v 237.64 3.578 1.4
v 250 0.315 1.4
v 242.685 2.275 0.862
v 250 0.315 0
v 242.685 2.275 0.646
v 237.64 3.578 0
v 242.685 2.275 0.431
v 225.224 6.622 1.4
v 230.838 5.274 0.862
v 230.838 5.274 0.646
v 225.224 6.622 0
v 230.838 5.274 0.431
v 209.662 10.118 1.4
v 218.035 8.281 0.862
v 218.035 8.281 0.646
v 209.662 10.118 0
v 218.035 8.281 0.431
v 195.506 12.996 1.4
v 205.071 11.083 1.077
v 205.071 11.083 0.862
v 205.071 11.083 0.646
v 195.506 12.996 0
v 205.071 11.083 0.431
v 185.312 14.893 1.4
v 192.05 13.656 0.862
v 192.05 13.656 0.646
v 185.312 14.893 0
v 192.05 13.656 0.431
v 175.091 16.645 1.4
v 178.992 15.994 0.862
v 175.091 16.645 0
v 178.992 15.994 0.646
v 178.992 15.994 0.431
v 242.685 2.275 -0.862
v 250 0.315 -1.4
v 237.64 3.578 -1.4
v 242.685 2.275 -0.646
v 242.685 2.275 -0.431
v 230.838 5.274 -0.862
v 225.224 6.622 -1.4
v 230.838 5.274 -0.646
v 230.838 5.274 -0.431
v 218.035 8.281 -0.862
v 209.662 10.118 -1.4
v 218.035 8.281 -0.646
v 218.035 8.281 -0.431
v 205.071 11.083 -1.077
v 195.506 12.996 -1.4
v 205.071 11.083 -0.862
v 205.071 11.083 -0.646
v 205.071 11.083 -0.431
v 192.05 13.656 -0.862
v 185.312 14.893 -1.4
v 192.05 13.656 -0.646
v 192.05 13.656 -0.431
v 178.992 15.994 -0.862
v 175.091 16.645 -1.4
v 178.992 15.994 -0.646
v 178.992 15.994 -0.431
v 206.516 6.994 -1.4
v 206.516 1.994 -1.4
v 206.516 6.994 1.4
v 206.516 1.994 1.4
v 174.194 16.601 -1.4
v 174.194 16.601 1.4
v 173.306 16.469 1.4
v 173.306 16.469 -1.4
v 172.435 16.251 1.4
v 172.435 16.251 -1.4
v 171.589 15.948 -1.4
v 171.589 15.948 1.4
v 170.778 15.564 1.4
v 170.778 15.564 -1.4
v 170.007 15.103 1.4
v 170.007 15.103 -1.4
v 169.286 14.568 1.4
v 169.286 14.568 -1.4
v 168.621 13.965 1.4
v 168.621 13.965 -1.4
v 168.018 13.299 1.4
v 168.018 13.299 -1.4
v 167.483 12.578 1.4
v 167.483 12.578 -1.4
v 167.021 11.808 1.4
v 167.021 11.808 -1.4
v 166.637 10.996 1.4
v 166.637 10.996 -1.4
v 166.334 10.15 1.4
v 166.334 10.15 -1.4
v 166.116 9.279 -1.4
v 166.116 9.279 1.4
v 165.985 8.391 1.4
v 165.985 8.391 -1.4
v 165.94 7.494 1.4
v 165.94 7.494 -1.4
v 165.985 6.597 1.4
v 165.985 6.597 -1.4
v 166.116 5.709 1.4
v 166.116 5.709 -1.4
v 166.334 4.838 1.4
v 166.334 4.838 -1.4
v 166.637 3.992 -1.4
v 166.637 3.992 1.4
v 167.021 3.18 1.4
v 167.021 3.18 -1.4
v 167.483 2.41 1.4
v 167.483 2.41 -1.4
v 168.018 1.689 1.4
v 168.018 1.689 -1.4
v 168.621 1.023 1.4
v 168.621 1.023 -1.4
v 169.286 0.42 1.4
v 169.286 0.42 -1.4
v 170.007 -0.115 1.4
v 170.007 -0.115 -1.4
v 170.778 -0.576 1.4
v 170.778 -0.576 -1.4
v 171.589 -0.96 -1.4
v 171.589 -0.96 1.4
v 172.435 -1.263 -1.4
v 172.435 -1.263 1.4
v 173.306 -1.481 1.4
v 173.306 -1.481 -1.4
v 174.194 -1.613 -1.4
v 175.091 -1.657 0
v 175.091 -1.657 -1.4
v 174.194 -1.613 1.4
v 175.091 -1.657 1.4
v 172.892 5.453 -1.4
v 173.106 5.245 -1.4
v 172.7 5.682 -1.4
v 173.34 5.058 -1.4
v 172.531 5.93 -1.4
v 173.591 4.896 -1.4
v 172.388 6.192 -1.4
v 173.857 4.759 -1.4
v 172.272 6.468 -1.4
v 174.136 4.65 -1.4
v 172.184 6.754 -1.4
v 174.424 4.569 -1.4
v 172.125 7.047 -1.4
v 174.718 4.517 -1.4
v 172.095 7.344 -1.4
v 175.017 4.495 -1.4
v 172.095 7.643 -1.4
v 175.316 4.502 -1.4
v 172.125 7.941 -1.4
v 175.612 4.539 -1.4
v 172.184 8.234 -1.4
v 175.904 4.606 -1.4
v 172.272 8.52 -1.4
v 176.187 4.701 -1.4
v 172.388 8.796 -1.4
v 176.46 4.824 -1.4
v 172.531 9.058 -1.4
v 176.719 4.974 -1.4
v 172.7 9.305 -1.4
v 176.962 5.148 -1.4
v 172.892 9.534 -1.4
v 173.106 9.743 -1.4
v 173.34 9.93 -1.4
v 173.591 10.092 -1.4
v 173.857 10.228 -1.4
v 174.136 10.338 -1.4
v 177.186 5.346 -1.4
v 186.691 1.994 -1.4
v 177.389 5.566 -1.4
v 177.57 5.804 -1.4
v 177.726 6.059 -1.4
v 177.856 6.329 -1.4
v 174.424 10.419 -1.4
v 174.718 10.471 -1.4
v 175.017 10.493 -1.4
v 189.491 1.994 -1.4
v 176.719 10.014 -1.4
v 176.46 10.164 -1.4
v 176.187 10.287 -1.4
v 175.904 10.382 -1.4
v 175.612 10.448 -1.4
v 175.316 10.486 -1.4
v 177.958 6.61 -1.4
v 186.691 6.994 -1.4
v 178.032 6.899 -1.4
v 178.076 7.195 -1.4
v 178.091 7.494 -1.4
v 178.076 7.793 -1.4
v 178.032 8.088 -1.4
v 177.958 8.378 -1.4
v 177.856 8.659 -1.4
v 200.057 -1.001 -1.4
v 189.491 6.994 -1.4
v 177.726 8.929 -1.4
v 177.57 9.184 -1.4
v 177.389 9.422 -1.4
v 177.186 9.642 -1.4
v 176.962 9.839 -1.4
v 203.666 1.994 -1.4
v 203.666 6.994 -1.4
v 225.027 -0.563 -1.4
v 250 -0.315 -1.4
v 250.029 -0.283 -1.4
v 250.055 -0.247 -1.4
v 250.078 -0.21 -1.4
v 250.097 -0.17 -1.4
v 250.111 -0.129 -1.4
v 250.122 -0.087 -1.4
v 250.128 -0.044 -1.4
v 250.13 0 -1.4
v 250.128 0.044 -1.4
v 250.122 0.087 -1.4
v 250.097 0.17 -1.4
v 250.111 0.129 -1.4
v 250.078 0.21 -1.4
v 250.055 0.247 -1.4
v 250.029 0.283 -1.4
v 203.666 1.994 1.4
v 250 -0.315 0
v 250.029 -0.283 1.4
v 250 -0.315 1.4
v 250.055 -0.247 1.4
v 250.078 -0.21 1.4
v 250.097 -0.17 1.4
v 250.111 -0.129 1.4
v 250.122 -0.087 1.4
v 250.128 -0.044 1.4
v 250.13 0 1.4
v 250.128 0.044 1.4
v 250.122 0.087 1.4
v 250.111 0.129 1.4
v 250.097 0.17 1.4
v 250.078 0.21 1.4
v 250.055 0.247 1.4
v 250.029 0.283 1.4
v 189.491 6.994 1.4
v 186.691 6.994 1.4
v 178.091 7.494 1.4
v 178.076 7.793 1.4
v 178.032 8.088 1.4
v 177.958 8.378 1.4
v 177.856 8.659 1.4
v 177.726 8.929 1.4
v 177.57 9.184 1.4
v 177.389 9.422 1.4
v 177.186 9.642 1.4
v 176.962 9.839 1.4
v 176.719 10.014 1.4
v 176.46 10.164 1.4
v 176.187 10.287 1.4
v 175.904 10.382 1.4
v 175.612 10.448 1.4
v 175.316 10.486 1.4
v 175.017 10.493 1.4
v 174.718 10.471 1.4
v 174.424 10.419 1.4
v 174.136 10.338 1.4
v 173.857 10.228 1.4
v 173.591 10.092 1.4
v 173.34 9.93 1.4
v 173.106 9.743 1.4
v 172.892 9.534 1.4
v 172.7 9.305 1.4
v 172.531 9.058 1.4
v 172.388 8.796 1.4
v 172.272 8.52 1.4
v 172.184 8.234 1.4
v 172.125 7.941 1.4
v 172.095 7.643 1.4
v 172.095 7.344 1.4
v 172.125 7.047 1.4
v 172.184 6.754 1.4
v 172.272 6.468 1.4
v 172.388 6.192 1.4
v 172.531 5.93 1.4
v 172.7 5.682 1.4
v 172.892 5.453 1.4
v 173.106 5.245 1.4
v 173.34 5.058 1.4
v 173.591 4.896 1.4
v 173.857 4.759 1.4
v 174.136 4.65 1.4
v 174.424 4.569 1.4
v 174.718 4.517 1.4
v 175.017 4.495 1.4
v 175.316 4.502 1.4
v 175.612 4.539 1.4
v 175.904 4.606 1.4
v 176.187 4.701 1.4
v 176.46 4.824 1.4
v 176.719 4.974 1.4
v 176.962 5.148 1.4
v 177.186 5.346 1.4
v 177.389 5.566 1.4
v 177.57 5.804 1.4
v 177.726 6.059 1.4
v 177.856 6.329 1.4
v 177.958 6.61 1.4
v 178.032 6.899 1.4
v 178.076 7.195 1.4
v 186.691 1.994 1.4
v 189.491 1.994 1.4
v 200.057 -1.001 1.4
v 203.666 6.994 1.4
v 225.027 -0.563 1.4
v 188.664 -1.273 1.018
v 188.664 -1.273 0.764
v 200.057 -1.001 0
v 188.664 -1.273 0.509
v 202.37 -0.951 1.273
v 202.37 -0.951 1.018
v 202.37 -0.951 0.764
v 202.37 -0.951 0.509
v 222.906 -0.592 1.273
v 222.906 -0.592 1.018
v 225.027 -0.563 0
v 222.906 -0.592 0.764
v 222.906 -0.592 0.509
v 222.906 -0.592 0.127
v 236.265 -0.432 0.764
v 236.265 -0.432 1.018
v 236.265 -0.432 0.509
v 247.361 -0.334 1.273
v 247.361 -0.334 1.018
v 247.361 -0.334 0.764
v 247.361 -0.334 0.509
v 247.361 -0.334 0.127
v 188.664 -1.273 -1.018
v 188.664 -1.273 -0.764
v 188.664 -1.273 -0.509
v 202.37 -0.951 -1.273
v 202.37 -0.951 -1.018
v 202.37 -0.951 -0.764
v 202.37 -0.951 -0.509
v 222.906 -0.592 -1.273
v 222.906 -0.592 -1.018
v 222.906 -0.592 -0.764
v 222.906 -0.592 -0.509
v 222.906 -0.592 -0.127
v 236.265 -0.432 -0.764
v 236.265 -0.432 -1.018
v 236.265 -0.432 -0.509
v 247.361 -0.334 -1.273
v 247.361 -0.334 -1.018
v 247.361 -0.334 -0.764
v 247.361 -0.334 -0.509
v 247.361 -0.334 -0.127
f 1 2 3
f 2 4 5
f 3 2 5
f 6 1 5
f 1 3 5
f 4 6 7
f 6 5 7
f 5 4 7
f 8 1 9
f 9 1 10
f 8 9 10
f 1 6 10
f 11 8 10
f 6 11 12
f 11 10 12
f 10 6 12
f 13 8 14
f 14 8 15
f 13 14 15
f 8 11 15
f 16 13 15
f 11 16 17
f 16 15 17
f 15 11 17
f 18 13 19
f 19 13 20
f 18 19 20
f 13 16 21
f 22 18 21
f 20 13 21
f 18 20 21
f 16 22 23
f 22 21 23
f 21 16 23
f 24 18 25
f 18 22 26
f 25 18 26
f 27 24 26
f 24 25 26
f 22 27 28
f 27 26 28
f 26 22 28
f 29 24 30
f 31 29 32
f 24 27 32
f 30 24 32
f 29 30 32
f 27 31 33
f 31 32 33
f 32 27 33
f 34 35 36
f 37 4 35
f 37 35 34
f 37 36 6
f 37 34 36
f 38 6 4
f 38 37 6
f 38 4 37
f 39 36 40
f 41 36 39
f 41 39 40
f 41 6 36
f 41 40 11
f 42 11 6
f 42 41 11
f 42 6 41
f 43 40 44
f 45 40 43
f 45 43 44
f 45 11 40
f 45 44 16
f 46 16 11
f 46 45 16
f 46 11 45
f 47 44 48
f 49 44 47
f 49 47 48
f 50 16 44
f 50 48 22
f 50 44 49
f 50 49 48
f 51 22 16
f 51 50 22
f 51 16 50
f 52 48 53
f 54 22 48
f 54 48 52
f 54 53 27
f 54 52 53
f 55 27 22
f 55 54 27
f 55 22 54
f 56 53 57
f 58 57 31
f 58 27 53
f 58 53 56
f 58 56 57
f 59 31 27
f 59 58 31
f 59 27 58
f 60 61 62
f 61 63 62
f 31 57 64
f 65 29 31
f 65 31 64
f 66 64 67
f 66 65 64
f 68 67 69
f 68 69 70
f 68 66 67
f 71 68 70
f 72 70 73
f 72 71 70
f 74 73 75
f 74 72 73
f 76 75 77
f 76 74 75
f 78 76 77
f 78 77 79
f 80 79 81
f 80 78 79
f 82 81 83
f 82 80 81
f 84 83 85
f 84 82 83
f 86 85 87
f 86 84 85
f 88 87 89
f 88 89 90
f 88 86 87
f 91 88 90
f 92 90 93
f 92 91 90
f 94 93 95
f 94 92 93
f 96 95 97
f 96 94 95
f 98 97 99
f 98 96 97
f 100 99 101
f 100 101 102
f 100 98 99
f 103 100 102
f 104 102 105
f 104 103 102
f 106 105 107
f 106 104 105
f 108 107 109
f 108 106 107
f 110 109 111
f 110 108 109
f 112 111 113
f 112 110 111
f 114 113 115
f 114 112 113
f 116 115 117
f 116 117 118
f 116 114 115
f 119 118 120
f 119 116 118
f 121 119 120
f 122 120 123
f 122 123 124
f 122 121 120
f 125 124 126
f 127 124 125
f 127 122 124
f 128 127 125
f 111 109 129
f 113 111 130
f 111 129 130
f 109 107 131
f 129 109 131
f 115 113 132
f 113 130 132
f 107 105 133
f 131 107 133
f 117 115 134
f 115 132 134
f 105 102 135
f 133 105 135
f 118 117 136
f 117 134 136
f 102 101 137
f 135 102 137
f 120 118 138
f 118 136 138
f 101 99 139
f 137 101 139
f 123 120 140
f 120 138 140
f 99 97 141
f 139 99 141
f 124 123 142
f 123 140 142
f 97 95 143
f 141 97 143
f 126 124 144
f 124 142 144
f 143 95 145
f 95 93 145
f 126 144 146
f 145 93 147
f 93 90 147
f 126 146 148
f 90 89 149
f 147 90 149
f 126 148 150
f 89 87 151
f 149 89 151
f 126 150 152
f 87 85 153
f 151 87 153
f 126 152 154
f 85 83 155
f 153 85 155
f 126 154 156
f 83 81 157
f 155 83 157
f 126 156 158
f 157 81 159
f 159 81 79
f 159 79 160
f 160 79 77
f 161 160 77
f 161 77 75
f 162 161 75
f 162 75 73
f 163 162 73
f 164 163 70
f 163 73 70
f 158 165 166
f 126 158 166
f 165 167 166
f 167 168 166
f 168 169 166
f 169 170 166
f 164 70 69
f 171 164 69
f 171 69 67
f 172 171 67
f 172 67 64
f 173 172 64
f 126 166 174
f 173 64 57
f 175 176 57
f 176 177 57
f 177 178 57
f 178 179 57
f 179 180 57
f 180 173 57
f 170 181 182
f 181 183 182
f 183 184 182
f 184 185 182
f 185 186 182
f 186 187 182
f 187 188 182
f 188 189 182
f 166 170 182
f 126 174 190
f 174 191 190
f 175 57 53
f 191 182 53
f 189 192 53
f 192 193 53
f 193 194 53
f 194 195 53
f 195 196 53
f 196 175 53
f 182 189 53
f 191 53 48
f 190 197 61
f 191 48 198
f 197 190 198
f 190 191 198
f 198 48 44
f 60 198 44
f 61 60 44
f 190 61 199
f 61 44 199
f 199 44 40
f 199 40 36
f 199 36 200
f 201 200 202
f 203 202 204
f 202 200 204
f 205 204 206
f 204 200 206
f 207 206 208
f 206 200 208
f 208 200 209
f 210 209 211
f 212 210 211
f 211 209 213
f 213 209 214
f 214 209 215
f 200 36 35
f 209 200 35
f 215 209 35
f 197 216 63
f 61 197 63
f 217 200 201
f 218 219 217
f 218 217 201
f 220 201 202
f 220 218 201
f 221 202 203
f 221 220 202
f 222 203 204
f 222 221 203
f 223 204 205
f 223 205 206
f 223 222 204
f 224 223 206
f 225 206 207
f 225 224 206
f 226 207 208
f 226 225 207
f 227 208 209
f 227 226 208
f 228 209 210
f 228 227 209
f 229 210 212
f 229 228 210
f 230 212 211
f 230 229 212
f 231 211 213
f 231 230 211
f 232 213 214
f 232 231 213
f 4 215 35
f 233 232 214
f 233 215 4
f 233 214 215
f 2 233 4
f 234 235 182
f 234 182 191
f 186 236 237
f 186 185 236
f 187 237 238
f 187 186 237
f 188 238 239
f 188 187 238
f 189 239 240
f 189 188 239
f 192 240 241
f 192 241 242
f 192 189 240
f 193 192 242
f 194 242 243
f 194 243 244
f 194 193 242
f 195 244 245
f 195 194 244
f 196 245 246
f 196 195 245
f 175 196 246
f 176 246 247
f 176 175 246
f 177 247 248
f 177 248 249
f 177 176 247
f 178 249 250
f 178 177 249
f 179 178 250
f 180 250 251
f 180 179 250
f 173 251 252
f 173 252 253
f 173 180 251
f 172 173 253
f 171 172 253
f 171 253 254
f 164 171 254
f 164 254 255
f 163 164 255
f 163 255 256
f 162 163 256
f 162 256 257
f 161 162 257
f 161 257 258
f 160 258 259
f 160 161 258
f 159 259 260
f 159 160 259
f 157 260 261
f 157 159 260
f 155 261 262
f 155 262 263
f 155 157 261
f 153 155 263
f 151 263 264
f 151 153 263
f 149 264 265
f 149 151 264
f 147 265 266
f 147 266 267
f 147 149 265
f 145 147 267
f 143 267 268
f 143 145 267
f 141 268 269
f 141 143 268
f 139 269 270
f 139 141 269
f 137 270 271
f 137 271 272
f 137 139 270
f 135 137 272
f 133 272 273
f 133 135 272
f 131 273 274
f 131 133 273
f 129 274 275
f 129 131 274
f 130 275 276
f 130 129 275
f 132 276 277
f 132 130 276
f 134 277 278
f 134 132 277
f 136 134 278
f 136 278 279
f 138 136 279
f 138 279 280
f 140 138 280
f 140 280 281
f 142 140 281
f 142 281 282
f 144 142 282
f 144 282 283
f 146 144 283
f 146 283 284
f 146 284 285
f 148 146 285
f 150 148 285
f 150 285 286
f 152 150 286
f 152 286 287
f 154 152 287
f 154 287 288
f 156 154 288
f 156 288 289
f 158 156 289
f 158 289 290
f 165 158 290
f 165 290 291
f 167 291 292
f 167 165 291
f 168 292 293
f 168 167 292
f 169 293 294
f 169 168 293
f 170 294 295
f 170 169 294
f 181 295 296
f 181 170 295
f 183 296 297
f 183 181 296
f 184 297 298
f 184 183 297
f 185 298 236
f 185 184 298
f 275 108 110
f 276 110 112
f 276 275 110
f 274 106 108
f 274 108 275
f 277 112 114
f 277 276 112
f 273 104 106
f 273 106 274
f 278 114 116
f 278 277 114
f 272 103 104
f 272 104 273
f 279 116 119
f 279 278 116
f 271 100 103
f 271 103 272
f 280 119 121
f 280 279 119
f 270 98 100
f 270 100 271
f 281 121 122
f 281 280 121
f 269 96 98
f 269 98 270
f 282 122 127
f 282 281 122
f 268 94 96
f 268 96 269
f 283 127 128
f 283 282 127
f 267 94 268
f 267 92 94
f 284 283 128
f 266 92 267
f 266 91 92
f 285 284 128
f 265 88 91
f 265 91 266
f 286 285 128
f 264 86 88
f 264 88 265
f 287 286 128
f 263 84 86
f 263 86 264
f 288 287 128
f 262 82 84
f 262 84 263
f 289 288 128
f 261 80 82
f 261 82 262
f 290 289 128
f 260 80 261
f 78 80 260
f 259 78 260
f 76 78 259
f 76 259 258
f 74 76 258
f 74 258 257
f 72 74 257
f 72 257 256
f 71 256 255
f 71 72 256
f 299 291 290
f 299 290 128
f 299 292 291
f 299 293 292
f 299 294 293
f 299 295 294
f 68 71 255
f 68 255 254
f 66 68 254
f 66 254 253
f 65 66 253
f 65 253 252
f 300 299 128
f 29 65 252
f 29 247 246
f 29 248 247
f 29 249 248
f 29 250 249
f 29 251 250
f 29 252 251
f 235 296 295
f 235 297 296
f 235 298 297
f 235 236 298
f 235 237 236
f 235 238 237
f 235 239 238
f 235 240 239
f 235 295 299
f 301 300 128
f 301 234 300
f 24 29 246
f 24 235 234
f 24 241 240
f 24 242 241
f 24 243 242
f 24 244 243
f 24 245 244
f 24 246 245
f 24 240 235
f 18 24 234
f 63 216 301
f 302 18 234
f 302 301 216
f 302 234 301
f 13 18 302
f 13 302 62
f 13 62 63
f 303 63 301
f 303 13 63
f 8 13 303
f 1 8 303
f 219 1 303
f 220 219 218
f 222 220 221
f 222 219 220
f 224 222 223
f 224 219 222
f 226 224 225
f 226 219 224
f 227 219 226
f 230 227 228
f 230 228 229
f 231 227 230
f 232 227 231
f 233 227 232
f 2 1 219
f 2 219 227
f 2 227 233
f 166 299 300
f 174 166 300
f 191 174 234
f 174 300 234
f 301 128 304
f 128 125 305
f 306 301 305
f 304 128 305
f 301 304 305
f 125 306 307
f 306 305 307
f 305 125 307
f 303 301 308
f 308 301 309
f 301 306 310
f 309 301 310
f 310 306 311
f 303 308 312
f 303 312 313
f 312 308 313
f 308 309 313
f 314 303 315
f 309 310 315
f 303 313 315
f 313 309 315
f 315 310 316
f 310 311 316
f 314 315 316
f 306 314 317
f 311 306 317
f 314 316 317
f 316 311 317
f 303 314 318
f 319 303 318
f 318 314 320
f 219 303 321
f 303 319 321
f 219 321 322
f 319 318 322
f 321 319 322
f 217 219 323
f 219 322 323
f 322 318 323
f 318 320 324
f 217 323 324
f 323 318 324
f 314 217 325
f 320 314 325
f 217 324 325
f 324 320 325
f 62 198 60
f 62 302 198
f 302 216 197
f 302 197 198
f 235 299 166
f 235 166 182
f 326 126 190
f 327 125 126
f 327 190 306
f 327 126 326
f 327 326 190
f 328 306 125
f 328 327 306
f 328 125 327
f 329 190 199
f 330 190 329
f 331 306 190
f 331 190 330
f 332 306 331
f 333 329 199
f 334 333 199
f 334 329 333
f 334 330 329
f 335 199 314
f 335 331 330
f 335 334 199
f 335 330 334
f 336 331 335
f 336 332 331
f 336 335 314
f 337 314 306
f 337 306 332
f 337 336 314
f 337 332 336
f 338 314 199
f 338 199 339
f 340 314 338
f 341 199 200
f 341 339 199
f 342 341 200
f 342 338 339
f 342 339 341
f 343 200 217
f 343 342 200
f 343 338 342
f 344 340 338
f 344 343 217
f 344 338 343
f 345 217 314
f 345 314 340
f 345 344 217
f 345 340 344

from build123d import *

# Parameters (mm, degrees)
SKETCH_1_R      = 3
SKETCH_1_W      = 2.8
SKETCH_1_H      = 5
SKETCH_1_W_2    = 2.85
EXTRUDE_1_DEPTH = 1.4


with BuildPart() as part:
    # Эскиз1 → Бобышка-Вытянуть1 (new, symmetric)
    with BuildSketch(Plane.XY):
        with BuildLine():
            ThreePointArc((175.091334091, 16.644787515), (168.620686799, 13.96455765), (165.940456932, 7.493910359))
            ThreePointArc((165.940456932, 7.493910359), (168.620686797, 1.023263065), (175.091334091, -1.656966802))
            add(Edge.make_bspline(
                [(175.091334091, -1.656966802), (177.330680613, -1.588466601), (181.854695323, -1.455127256), (188.663234462, -1.270383377), (195.516645168, -1.101112884), (202.369532894, -0.948617189), (211.49919029, -0.767742353), (220.603098666, -0.619939742), (229.617630172, -0.50292618), (236.087353854, -0.431514192), (241.980776913, -0.376520461), (246.558970011, -0.339535886), (249.120490965, -0.321271242), (250, -0.315)],
                knots=[0.704401069, 0.704401069, 0.704401069, 0.704401069, 0.730918775, 0.757971338, 0.785017763, 0.812061651, 0.839103366, 0.893099152, 0.919831065, 0.945809917, 0.969680601, 0.989589706, 1, 1, 1, 1], degree=3))
            ThreePointArc((250, -0.315), (250.130477272, 0), (250, 0.315))
            add(Edge.make_bspline(
                [(250, 0.315), (249.15566774, 0.545019818), (246.720175698, 1.208516243), (242.391332083, 2.358339053), (236.849761204, 3.787625364), (230.779918279, 5.298008837), (224.455917947, 6.812866028), (218.030543496, 8.291610632), (211.562405045, 9.719735057), (205.072411509, 11.092374932), (198.567970913, 12.407850726), (192.052369914, 13.665297924), (185.527619973, 14.864093303), (179.872800983, 15.850364437), (176.392239334, 16.431323122), (175.091334091, 16.644787515)],
                knots=[0, 0, 0, 0, 0.0101622, 0.029313053, 0.052011605, 0.076619468, 0.101948061, 0.127526132, 0.153184131, 0.178867888, 0.204557903, 0.230245712, 0.255925967, 0.281594302, 0.296903142, 0.296903142, 0.296903142, 0.296903142], degree=3))
        make_face()
        with Locations((175.091334091, 7.493910357)):
            Circle(SKETCH_1_R, mode=Mode.SUBTRACT)
        with Locations((188.091334091, 4.493910357)):
            Rectangle(SKETCH_1_W, SKETCH_1_H, mode=Mode.SUBTRACT)
        with Locations((205.091334091, 4.493910357)):
            Rectangle(SKETCH_1_W_2, SKETCH_1_H, mode=Mode.SUBTRACT)
    extrude(amount=EXTRUDE_1_DEPTH, both=True)


solid = part.part
